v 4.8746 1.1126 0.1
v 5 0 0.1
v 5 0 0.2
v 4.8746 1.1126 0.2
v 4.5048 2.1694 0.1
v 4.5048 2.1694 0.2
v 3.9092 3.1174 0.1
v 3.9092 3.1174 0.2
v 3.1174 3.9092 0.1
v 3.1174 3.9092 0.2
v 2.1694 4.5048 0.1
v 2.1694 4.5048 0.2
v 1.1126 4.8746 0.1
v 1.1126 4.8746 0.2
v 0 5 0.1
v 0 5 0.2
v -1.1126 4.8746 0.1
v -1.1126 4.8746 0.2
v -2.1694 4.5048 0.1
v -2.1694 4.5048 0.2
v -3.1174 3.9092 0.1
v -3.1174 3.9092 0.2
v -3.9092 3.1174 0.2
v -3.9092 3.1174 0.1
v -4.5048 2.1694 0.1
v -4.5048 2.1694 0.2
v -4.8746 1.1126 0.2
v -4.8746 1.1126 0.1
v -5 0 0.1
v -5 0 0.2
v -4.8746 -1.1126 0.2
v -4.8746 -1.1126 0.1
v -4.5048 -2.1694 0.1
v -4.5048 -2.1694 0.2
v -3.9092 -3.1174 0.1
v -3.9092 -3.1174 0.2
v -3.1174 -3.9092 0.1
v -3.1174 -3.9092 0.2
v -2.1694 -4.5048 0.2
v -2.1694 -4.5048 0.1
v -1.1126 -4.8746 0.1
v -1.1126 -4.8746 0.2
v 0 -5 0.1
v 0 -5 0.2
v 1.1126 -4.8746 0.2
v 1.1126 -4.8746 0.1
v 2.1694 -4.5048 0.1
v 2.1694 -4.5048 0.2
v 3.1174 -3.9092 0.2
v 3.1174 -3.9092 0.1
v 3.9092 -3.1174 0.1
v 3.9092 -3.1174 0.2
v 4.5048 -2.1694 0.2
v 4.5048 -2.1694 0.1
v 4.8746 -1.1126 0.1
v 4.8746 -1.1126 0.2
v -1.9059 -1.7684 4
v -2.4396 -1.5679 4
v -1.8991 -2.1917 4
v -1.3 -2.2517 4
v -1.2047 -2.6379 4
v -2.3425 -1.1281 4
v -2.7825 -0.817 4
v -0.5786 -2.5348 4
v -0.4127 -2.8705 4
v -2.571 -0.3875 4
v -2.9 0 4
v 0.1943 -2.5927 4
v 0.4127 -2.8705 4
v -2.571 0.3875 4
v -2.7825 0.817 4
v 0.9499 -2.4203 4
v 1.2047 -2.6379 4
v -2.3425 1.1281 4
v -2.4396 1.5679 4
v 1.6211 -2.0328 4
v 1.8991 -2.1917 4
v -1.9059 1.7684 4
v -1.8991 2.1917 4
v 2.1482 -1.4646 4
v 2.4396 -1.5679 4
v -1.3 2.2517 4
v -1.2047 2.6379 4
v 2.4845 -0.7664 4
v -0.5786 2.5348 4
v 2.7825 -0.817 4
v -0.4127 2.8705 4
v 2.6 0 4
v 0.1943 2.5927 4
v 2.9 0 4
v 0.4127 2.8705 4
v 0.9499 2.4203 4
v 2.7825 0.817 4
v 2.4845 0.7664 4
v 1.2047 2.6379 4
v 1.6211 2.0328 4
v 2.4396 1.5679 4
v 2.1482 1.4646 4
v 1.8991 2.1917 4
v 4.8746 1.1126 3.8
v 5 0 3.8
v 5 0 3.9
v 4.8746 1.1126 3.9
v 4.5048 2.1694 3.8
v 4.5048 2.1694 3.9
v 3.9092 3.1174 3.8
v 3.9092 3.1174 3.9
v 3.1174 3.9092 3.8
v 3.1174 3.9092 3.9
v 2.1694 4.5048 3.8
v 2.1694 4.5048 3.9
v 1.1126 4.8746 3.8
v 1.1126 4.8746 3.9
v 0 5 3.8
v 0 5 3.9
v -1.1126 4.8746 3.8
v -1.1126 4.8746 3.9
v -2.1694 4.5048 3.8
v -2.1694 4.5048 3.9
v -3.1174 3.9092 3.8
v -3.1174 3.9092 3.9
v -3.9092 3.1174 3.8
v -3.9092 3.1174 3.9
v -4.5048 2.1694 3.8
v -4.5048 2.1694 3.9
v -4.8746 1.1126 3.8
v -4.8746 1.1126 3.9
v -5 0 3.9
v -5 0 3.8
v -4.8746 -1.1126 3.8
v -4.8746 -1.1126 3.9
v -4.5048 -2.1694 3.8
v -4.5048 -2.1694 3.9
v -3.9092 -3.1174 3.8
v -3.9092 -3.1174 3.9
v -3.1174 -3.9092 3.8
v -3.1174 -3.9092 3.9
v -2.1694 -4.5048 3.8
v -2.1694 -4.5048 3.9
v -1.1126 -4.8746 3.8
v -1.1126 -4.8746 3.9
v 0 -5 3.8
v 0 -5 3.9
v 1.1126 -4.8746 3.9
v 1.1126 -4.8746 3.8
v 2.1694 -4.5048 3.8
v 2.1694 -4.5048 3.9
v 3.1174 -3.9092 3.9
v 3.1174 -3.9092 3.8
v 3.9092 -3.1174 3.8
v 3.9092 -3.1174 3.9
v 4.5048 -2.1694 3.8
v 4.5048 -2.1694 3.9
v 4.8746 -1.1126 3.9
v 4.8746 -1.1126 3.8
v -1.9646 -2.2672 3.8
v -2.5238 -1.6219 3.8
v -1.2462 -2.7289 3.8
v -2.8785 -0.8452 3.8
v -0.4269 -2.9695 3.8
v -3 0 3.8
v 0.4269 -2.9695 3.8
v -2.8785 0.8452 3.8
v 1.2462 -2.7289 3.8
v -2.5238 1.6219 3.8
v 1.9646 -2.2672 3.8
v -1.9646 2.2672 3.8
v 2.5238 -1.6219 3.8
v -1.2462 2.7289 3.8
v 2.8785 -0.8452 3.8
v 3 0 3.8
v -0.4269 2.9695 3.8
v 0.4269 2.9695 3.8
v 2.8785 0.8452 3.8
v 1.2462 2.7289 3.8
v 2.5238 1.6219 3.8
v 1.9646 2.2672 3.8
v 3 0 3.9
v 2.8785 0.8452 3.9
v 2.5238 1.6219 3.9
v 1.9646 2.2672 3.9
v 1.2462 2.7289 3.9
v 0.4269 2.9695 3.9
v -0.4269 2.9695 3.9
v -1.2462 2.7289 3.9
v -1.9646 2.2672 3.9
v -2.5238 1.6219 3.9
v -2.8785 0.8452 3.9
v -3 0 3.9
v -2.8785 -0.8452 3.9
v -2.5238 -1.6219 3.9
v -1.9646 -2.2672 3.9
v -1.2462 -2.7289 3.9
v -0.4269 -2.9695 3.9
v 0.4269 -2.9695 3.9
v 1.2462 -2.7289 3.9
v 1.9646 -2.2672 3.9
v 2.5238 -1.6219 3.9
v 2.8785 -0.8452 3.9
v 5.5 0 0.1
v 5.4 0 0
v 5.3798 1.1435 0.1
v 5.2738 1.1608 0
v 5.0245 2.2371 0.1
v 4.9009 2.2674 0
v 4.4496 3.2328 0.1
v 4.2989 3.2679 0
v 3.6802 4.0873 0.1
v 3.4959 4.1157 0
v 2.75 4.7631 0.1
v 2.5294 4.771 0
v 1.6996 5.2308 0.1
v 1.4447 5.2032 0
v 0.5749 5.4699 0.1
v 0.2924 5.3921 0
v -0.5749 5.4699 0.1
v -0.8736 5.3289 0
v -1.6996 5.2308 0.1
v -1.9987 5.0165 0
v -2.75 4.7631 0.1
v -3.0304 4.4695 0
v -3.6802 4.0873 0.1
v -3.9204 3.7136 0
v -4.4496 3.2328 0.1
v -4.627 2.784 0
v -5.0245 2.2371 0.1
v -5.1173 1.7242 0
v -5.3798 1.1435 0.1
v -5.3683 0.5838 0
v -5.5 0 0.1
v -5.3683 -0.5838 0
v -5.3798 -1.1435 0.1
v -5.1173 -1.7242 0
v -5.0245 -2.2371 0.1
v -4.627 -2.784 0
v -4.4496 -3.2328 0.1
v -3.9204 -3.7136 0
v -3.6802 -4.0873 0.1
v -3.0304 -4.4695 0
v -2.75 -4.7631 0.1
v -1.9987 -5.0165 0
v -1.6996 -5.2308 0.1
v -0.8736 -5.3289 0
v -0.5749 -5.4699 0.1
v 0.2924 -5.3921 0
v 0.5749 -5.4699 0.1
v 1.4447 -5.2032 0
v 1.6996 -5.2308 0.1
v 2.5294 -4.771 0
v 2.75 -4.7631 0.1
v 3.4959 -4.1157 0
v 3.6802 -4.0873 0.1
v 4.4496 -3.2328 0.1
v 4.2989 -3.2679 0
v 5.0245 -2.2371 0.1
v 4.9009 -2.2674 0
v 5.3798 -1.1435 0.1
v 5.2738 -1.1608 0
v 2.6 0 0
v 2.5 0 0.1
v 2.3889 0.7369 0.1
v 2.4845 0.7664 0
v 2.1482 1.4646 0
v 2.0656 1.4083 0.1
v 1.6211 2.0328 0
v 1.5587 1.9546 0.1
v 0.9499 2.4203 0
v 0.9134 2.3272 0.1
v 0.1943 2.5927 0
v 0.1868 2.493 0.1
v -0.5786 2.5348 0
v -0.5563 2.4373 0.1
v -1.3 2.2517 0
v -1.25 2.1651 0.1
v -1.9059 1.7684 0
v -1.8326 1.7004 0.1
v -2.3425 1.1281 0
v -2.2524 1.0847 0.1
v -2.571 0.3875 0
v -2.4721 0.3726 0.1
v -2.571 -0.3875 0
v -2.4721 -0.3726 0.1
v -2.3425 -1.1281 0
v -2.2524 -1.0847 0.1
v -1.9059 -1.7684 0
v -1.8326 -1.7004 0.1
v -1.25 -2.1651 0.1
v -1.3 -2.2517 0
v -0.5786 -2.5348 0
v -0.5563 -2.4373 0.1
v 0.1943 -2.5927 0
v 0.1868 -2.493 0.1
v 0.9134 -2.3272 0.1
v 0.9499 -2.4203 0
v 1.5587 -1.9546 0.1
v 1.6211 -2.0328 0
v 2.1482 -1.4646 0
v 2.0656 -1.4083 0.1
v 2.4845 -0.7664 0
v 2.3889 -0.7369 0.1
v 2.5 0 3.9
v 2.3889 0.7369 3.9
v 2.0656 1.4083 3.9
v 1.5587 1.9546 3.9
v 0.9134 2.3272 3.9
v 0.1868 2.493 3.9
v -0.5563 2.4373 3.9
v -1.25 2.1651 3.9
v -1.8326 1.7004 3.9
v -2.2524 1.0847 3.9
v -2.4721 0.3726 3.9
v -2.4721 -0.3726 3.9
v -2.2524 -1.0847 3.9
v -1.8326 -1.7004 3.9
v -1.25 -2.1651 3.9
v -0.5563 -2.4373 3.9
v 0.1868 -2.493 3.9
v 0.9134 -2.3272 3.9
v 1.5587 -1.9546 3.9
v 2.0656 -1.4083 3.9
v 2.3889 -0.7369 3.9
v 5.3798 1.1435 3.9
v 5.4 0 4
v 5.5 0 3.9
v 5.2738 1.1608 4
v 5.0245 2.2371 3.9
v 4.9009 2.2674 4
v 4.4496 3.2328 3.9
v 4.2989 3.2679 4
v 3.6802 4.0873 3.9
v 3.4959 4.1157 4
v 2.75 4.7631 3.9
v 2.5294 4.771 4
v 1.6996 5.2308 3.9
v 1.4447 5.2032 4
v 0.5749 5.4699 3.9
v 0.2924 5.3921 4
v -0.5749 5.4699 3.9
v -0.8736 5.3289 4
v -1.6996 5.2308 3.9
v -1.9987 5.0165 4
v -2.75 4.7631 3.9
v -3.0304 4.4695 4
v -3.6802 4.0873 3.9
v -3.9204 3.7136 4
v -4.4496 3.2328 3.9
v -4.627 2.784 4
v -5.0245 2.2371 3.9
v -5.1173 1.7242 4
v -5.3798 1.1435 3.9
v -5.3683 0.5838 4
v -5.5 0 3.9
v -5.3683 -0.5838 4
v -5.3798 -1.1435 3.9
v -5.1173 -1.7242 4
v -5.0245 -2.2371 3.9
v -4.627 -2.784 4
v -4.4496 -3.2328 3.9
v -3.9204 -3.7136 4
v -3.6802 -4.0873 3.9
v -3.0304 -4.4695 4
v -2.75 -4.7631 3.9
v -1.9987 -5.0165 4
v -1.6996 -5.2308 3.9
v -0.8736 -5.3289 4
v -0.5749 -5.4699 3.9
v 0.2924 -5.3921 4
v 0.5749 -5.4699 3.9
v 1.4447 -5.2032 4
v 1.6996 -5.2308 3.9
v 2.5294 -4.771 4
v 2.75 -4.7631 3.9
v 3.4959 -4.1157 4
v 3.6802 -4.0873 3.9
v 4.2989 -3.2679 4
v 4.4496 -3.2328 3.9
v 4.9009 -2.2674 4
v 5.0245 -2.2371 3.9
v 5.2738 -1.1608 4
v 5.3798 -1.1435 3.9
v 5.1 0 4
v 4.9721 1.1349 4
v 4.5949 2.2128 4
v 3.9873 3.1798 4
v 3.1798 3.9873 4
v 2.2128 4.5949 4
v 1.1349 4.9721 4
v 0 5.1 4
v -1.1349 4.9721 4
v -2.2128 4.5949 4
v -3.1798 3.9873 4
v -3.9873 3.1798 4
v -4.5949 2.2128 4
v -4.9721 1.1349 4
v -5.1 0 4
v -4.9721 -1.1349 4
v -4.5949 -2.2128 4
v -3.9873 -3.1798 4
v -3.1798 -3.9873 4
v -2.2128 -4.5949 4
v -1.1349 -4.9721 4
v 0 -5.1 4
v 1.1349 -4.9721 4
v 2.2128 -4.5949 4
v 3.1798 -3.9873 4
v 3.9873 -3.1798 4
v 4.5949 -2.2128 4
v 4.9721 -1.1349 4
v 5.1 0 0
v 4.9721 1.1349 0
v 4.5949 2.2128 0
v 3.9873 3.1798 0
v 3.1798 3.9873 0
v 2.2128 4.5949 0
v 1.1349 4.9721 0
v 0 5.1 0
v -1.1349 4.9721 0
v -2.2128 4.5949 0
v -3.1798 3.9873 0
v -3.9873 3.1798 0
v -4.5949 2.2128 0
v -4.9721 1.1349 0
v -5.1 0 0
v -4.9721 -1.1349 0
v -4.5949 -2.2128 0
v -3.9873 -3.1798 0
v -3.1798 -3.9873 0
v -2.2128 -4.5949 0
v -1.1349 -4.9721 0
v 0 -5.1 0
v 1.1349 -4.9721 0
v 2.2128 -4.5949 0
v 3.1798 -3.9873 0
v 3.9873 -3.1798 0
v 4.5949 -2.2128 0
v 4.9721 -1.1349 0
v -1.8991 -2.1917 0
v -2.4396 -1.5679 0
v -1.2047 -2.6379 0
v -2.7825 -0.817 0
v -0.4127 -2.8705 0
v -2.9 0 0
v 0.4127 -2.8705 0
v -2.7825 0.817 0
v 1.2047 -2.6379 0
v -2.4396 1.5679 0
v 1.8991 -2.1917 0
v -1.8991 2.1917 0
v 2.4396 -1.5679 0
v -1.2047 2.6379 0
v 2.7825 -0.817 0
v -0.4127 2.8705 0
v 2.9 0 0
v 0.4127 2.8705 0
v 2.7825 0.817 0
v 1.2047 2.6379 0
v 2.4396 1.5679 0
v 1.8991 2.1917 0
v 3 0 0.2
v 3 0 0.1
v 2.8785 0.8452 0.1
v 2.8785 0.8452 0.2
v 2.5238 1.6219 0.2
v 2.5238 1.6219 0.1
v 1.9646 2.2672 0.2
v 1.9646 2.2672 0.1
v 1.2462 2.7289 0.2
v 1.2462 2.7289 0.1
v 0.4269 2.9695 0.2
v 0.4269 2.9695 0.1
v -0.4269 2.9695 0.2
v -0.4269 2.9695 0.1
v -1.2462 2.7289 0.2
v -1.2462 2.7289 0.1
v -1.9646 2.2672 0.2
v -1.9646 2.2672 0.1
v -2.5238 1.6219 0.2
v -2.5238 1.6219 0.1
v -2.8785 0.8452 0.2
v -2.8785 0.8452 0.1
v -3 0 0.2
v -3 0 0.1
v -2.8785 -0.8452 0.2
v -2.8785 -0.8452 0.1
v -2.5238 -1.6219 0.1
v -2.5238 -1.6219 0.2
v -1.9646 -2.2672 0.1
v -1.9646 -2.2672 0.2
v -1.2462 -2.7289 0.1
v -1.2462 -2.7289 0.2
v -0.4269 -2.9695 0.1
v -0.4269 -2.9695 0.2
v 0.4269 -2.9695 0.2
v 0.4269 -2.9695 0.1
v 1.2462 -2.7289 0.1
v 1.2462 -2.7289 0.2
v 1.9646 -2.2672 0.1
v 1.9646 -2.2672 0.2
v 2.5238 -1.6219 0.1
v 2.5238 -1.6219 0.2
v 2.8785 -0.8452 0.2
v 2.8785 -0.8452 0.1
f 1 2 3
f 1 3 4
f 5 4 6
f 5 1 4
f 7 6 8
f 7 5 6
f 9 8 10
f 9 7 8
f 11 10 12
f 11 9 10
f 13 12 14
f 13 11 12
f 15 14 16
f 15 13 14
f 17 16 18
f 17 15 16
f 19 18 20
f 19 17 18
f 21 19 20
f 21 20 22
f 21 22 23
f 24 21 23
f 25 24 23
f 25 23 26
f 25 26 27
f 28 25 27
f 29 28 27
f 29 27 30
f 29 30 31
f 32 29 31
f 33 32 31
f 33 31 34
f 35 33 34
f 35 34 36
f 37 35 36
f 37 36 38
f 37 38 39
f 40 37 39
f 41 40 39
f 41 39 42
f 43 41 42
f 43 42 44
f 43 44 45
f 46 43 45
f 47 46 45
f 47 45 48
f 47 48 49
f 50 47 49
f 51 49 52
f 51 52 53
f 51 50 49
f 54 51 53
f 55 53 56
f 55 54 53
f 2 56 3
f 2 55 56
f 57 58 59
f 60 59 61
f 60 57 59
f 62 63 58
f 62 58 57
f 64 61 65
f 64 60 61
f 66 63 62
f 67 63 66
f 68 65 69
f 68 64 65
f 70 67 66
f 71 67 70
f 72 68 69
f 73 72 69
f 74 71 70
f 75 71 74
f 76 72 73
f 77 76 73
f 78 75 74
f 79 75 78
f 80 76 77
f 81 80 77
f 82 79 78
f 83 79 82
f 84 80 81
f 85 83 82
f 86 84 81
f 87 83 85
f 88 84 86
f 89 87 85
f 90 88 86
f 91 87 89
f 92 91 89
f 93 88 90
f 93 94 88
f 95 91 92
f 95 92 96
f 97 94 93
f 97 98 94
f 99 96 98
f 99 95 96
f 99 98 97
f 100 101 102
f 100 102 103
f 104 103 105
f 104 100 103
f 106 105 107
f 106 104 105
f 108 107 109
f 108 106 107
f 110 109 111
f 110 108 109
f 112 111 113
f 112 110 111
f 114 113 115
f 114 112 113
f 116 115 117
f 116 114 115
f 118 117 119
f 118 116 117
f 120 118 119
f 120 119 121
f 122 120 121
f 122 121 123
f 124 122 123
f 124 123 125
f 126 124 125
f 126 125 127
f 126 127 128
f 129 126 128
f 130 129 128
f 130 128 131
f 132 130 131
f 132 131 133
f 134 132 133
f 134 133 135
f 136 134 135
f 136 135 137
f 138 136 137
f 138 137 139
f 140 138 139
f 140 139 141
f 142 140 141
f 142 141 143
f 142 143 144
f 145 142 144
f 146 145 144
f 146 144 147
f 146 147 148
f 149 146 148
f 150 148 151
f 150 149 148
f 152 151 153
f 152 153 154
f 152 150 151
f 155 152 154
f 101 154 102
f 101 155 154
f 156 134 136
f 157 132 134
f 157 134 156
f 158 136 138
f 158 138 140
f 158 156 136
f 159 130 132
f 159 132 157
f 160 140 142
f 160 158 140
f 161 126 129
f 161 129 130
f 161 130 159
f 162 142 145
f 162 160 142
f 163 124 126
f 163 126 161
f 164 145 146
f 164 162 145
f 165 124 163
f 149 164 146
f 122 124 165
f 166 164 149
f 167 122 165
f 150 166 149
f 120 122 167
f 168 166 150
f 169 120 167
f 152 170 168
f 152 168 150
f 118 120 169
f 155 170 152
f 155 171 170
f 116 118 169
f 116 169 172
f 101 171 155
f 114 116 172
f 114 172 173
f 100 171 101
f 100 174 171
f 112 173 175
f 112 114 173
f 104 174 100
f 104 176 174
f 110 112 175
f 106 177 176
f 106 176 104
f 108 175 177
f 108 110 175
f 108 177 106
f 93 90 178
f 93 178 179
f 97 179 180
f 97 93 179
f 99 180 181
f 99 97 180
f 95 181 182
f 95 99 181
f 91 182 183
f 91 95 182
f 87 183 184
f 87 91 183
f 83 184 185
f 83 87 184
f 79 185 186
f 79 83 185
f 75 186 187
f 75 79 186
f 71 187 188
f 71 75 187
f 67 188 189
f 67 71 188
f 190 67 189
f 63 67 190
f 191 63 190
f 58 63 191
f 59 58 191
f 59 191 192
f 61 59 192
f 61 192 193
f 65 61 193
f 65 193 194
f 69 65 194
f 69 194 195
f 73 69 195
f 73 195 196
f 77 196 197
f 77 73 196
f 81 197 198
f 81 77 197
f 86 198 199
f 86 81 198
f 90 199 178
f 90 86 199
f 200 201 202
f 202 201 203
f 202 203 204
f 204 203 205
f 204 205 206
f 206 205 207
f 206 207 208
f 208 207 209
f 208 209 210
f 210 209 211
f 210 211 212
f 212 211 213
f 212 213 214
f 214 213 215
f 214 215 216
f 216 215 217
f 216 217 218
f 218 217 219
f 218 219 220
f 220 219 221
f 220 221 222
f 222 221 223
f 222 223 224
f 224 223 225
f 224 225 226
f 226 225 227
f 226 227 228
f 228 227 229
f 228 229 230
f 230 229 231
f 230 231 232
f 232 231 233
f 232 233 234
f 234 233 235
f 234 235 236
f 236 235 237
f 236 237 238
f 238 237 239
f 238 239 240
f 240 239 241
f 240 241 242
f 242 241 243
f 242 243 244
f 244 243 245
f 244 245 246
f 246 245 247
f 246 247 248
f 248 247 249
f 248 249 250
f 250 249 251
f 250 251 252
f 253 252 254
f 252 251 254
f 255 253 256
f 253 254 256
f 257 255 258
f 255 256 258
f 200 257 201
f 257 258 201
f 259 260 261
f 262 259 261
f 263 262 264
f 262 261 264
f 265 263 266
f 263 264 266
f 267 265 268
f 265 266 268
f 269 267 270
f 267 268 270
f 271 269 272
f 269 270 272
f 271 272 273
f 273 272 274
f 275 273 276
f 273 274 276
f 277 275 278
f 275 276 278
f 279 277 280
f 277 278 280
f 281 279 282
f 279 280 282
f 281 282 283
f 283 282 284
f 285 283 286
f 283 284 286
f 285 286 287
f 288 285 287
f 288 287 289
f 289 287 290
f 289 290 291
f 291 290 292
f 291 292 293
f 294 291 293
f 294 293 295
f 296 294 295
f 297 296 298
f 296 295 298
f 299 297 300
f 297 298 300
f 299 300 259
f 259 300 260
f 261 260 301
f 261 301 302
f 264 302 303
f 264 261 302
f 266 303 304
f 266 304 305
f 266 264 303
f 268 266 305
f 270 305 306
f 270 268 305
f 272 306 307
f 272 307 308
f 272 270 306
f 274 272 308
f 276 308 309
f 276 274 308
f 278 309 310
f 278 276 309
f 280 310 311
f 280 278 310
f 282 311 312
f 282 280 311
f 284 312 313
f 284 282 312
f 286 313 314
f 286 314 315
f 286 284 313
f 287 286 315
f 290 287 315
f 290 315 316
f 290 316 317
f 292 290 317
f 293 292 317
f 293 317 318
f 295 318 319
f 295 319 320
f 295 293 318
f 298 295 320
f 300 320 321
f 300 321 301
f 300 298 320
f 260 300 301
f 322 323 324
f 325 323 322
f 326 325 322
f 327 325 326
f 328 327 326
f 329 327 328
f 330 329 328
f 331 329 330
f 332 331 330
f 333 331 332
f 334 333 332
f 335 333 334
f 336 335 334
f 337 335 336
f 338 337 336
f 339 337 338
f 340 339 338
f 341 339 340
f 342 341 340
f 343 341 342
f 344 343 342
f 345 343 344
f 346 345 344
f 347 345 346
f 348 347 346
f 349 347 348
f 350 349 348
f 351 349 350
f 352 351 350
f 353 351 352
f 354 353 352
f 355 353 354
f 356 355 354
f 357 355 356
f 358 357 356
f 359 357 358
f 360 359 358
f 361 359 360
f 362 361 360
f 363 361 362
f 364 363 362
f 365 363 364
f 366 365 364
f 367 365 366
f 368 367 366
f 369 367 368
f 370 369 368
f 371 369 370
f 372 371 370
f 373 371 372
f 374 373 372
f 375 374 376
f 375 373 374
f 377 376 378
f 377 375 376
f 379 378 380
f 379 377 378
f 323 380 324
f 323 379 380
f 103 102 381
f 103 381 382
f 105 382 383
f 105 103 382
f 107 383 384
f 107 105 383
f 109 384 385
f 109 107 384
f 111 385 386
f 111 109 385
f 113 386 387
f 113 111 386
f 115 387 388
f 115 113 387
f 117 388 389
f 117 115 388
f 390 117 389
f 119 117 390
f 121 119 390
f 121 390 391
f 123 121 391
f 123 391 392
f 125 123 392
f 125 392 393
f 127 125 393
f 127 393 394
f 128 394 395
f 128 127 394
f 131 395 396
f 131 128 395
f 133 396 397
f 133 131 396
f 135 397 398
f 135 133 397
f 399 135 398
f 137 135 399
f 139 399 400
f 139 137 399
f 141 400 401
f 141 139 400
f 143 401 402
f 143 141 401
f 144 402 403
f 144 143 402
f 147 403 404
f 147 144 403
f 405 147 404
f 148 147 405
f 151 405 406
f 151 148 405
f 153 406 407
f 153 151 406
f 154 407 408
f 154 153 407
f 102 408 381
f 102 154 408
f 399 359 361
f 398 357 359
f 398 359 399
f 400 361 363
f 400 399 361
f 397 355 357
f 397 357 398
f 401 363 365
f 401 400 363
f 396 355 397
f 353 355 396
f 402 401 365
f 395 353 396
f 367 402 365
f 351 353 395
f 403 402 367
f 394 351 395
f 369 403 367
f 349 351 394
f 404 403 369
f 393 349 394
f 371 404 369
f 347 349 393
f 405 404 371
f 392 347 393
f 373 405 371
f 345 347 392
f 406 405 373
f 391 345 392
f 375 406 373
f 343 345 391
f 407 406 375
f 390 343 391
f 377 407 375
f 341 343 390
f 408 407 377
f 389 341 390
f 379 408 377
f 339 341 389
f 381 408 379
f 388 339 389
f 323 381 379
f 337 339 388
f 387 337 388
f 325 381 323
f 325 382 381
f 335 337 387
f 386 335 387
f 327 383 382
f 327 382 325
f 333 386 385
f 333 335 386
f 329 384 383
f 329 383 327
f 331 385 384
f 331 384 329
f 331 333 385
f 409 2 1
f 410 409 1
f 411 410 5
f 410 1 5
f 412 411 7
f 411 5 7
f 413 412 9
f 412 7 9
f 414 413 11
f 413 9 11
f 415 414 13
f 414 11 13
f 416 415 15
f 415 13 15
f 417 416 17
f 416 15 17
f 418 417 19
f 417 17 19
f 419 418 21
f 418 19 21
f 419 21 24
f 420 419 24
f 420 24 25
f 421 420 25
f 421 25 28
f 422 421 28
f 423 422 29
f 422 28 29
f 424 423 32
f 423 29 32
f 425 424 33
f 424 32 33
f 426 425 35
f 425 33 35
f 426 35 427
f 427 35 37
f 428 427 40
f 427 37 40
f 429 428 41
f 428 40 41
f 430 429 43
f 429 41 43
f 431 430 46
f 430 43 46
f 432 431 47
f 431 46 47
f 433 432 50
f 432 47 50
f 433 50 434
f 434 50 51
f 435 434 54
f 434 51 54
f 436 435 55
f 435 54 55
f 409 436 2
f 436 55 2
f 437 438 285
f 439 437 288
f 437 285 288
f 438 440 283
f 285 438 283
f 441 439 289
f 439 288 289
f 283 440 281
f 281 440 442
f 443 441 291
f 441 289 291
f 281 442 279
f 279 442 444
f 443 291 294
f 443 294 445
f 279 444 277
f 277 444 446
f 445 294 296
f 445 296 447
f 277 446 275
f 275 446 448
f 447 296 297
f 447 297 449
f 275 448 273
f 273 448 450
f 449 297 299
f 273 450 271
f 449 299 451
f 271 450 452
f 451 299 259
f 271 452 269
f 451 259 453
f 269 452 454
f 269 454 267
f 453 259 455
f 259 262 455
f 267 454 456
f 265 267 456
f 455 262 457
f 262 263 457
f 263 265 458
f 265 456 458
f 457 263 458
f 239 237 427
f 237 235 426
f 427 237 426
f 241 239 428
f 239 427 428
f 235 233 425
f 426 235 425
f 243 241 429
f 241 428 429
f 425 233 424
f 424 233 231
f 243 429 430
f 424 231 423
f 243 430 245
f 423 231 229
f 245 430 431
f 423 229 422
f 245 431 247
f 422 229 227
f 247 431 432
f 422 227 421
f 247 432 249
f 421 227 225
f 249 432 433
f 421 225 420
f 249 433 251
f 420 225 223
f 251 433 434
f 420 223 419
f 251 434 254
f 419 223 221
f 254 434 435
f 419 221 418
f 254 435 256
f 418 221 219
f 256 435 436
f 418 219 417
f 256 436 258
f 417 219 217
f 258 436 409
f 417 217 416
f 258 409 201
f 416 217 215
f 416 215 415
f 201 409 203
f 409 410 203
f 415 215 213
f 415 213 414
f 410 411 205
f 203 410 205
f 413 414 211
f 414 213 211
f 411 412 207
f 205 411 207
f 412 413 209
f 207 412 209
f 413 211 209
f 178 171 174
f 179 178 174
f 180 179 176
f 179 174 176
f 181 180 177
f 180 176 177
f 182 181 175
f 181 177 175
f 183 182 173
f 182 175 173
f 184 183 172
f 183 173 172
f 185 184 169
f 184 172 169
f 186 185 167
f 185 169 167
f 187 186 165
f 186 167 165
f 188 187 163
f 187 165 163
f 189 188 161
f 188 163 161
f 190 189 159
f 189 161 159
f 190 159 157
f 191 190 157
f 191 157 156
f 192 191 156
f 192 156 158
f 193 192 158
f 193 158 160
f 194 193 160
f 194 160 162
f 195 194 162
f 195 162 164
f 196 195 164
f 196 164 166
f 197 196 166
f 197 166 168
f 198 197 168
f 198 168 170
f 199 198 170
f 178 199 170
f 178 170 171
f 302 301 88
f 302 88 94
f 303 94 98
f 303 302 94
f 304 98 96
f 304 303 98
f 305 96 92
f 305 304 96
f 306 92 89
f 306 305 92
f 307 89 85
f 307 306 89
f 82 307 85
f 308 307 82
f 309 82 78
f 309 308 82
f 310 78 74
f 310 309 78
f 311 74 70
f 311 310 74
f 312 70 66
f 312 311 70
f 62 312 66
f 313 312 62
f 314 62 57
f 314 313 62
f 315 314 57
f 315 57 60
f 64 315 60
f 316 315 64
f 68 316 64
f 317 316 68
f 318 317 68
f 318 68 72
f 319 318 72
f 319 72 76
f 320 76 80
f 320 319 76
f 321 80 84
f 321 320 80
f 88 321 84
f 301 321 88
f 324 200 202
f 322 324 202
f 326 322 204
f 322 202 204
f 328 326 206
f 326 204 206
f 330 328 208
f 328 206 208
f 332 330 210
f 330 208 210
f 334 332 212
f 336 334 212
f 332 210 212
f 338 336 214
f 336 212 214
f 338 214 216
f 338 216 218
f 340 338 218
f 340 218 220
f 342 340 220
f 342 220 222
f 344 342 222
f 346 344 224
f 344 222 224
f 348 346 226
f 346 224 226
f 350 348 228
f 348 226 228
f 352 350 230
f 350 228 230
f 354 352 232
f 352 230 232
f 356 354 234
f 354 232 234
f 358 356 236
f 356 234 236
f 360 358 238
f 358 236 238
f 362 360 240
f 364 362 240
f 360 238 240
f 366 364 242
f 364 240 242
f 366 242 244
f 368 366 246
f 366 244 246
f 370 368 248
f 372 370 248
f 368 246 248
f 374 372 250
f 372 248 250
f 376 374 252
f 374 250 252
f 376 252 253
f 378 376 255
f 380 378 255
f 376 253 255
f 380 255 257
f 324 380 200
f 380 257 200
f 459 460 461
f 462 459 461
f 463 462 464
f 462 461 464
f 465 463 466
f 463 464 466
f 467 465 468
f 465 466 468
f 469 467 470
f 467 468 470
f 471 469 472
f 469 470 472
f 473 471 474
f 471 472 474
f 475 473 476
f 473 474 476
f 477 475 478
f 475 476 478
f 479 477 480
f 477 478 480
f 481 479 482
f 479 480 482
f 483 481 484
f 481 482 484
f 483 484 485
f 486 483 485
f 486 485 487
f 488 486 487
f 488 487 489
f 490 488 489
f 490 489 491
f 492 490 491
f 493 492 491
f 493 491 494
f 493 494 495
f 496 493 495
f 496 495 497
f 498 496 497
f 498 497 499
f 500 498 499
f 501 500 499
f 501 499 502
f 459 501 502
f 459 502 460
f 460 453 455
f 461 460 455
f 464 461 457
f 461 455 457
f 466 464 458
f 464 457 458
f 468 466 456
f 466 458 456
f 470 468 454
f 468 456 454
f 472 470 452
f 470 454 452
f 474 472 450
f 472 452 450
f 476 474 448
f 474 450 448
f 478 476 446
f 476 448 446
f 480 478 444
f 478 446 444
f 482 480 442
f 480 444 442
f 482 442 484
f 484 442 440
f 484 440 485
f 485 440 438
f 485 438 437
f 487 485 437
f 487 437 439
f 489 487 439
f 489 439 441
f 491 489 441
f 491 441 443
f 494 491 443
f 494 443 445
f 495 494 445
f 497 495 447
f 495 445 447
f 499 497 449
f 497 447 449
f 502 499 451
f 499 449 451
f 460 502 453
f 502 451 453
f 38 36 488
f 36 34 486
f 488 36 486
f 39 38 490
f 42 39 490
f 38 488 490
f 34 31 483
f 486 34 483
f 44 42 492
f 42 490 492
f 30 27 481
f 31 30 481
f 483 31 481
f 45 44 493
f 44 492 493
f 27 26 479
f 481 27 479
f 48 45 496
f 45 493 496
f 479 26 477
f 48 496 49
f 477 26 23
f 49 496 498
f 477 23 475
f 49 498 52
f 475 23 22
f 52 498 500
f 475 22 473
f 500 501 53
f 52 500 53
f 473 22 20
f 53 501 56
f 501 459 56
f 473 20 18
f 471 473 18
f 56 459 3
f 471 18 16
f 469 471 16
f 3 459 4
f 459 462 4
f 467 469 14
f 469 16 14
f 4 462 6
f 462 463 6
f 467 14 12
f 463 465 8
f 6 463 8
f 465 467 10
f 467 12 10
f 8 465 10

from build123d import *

# Parameters (mm, degrees)
F0_R     = 3
F0_R_2   = 2.5
F1_DEPTH = 4
F0_R_3   = 5.5
F0_R_4   = 5
F2_START = 0.2
F2_DEPTH = 3.6
F3_SIZE  = 0.1


with BuildPart() as f1:
    # F0 (on Top) → F1 (new body)
    with BuildSketch(Plane.XY):
        Circle(F0_R)
        Circle(F0_R_2, mode=Mode.SUBTRACT)
    extrude(amount=F1_DEPTH)



with BuildPart() as f1b:
    # F0 (on Top) → F1, piece 2 (new body)
    with BuildSketch(Plane.XY):
        Circle(F0_R_3)
        Circle(F0_R_4, mode=Mode.SUBTRACT)
    extrude(amount=F1_DEPTH)


with BuildPart() as f1_1:
    add(f1.part)

    add(f1b.part)  # F2 merges F1b
    # F0 (on Top) → F2 (join)
    with BuildSketch(Plane.XY.offset(F2_START)):
        Circle(F0_R_4)
        Circle(F0_R, mode=Mode.SUBTRACT)
    extrude(amount=F2_DEPTH)

    # F3
    f3_edges = [f1_1.edges().sort_by_distance(p)[0] for p in [
        (-3, 0, 0),
        (-2.5, 0, 0),
        (-5.5, 0, 4),
        (-5, 0, 4),
        (-3, 0, 4),
        (-2.5, 0, 4),
        (-5.5, 0, 0),
        (-5, 0, 0),
    ]]
    chamfer(f3_edges, length=F3_SIZE)


solid = f1_1.part
